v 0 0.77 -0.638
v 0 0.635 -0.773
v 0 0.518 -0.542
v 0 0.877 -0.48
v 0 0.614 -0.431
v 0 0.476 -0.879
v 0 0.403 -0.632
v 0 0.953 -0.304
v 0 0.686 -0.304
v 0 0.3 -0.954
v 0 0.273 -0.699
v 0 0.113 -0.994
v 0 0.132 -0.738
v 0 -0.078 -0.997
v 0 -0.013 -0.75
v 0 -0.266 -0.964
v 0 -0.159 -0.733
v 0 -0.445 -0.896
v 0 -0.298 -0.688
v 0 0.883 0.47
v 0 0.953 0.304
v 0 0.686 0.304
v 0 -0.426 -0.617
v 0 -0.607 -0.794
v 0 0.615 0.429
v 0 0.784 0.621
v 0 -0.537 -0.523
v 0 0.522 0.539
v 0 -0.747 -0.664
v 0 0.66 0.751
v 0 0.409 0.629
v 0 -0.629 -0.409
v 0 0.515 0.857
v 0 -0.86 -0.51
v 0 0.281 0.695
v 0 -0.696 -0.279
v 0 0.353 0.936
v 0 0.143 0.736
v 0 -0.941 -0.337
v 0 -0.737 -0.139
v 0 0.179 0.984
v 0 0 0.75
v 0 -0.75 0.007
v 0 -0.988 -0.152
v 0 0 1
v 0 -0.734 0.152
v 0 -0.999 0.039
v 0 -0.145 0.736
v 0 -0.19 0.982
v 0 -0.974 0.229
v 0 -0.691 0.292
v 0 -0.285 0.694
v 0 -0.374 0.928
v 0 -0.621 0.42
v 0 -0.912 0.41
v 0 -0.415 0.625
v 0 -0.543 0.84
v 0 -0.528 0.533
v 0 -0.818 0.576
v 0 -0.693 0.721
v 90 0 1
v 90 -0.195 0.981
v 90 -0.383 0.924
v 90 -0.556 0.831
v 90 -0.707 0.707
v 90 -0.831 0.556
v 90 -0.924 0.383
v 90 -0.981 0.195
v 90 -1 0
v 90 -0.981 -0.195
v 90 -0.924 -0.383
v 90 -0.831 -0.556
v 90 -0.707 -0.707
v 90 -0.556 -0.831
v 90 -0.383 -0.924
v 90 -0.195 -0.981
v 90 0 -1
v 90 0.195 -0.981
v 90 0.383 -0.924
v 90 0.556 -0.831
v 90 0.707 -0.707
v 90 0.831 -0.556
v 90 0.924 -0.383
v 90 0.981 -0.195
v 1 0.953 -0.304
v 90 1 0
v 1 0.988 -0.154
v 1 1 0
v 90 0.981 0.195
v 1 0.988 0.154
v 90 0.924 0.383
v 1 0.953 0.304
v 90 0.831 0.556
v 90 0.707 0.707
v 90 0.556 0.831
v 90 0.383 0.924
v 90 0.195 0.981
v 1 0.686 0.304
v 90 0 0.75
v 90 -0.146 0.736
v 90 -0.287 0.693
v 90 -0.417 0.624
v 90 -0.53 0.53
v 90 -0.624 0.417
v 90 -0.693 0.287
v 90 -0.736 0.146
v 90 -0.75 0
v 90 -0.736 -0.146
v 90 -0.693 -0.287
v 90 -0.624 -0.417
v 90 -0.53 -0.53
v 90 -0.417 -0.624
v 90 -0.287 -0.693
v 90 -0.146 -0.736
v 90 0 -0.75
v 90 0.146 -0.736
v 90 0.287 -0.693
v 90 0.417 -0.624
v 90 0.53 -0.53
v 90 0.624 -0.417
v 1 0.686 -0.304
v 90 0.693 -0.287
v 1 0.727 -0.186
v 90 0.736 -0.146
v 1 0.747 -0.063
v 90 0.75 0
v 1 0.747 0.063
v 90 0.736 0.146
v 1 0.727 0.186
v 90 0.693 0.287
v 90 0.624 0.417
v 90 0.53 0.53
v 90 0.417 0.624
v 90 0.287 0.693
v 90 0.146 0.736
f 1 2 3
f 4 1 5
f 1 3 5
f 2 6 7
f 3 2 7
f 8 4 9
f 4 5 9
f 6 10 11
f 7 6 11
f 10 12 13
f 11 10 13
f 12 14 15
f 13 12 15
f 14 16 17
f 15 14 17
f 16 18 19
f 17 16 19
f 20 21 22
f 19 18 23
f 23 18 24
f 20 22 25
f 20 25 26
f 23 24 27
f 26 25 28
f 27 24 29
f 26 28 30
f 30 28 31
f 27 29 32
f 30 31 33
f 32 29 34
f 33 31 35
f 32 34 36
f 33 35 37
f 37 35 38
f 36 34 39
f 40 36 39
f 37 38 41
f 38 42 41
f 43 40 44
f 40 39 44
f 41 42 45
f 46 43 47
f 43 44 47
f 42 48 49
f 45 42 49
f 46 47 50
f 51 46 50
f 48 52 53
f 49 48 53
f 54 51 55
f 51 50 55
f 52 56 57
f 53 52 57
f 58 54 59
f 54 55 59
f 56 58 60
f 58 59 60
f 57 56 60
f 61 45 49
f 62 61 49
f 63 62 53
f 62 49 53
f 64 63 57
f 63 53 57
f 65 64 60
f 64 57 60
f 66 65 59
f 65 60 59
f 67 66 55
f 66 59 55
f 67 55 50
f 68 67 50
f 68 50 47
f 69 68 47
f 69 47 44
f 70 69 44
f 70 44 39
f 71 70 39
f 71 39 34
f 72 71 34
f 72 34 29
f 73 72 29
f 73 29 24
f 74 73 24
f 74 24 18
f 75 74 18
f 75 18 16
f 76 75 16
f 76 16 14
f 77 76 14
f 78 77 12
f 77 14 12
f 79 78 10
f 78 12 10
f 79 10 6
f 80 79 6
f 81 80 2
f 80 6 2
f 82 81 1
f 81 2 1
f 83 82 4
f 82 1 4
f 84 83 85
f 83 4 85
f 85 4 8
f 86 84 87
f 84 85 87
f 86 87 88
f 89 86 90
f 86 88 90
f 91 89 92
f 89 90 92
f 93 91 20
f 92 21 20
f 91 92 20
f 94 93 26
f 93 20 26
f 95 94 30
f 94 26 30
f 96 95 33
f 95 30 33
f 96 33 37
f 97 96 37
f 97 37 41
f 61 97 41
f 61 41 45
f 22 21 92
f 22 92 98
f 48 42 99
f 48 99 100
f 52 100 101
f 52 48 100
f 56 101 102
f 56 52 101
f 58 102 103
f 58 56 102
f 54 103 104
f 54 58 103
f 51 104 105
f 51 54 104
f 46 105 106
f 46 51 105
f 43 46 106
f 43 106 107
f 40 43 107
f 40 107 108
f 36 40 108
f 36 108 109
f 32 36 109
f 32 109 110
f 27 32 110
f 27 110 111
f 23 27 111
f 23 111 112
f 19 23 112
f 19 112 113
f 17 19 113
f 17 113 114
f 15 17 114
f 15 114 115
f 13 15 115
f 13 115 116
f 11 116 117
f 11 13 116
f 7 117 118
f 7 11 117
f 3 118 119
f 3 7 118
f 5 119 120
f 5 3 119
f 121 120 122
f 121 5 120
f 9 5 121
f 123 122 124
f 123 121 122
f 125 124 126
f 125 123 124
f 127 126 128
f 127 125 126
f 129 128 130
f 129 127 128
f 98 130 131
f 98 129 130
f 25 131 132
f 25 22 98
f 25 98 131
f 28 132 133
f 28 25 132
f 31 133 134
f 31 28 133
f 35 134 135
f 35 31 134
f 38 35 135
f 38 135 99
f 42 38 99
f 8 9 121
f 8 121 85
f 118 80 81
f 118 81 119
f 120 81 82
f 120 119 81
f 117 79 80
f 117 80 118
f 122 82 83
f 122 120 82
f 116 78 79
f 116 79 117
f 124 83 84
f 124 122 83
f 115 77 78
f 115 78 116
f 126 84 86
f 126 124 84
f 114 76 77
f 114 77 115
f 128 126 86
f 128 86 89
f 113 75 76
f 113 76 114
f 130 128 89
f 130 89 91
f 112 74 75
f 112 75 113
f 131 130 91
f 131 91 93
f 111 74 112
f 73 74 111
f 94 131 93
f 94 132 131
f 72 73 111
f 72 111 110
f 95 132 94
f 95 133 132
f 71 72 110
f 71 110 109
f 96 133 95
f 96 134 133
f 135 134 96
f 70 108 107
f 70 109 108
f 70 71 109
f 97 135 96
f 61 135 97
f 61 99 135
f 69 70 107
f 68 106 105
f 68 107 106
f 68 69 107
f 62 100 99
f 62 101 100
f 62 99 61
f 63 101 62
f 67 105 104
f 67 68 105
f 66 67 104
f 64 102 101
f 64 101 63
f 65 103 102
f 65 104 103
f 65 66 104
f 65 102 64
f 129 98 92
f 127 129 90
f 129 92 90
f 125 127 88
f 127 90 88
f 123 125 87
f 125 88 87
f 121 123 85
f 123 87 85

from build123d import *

# Parameters (mm, degrees)
SKETCH1_R           = 1
SKETCH1_R_2         = 0.75
BOSS_EXTRUDE1_DEPTH = 90
CUT_EXTRUDE1_DEPTH  = 1


with BuildPart() as part:
    # Sketch1 → Boss-Extrude1 (new body)
    with BuildSketch(Plane(origin=(0, 0, 0), x_dir=(0, 0, -1), z_dir=(1, 0, 0))):
        Circle(SKETCH1_R)
        Circle(SKETCH1_R_2, mode=Mode.SUBTRACT)
    extrude(amount=BOSS_EXTRUDE1_DEPTH)

    # Sketch2 → Cut-Extrude1 (cut)
    with BuildSketch(Plane.ZY):
        with BuildLine():
            Line((-0.304, 0.610565492), (-0.304, 1.099202537))
            Line((-0.304, 1.099202537), (0.304, 1.099202537))
            Line((0.304, 1.099202537), (0.304, 0.610565492))
            ThreePointArc((0.304, 0.610565492), (0, 0.306565492), (-0.304, 0.610565492))
        make_face()
    extrude(amount=-CUT_EXTRUDE1_DEPTH, mode=Mode.SUBTRACT)


solid = part.part
